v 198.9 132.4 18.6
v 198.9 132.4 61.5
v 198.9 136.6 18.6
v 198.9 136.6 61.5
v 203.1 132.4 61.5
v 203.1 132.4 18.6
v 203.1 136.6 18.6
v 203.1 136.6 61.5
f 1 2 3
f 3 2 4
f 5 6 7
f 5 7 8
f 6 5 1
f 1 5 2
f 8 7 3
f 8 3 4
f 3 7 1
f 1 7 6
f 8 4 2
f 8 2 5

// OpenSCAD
// Generated by the canonical parent Python sources and validated exchange pipeline.
polyhedron(points=[[198.89999389648438, 132.39999389648438, 18.600000381469727], [198.89999389648438, 132.39999389648438, 61.5], [198.89999389648438, 136.60000610351562, 18.600000381469727], [198.89999389648438, 136.60000610351562, 61.5], [203.10000610351562, 132.39999389648438, 61.5], [203.10000610351562, 132.39999389648438, 18.600000381469727], [203.10000610351562, 136.60000610351562, 18.600000381469727], [203.10000610351562, 136.60000610351562, 61.5]],faces=[[2, 1, 0], [3, 1, 2], [6, 5, 4], [7, 6, 4], [0, 4, 5], [1, 4, 0], [2, 6, 7], [3, 2, 7], [0, 6, 2], [5, 6, 0], [1, 3, 7], [4, 1, 7]],convexity=10);
